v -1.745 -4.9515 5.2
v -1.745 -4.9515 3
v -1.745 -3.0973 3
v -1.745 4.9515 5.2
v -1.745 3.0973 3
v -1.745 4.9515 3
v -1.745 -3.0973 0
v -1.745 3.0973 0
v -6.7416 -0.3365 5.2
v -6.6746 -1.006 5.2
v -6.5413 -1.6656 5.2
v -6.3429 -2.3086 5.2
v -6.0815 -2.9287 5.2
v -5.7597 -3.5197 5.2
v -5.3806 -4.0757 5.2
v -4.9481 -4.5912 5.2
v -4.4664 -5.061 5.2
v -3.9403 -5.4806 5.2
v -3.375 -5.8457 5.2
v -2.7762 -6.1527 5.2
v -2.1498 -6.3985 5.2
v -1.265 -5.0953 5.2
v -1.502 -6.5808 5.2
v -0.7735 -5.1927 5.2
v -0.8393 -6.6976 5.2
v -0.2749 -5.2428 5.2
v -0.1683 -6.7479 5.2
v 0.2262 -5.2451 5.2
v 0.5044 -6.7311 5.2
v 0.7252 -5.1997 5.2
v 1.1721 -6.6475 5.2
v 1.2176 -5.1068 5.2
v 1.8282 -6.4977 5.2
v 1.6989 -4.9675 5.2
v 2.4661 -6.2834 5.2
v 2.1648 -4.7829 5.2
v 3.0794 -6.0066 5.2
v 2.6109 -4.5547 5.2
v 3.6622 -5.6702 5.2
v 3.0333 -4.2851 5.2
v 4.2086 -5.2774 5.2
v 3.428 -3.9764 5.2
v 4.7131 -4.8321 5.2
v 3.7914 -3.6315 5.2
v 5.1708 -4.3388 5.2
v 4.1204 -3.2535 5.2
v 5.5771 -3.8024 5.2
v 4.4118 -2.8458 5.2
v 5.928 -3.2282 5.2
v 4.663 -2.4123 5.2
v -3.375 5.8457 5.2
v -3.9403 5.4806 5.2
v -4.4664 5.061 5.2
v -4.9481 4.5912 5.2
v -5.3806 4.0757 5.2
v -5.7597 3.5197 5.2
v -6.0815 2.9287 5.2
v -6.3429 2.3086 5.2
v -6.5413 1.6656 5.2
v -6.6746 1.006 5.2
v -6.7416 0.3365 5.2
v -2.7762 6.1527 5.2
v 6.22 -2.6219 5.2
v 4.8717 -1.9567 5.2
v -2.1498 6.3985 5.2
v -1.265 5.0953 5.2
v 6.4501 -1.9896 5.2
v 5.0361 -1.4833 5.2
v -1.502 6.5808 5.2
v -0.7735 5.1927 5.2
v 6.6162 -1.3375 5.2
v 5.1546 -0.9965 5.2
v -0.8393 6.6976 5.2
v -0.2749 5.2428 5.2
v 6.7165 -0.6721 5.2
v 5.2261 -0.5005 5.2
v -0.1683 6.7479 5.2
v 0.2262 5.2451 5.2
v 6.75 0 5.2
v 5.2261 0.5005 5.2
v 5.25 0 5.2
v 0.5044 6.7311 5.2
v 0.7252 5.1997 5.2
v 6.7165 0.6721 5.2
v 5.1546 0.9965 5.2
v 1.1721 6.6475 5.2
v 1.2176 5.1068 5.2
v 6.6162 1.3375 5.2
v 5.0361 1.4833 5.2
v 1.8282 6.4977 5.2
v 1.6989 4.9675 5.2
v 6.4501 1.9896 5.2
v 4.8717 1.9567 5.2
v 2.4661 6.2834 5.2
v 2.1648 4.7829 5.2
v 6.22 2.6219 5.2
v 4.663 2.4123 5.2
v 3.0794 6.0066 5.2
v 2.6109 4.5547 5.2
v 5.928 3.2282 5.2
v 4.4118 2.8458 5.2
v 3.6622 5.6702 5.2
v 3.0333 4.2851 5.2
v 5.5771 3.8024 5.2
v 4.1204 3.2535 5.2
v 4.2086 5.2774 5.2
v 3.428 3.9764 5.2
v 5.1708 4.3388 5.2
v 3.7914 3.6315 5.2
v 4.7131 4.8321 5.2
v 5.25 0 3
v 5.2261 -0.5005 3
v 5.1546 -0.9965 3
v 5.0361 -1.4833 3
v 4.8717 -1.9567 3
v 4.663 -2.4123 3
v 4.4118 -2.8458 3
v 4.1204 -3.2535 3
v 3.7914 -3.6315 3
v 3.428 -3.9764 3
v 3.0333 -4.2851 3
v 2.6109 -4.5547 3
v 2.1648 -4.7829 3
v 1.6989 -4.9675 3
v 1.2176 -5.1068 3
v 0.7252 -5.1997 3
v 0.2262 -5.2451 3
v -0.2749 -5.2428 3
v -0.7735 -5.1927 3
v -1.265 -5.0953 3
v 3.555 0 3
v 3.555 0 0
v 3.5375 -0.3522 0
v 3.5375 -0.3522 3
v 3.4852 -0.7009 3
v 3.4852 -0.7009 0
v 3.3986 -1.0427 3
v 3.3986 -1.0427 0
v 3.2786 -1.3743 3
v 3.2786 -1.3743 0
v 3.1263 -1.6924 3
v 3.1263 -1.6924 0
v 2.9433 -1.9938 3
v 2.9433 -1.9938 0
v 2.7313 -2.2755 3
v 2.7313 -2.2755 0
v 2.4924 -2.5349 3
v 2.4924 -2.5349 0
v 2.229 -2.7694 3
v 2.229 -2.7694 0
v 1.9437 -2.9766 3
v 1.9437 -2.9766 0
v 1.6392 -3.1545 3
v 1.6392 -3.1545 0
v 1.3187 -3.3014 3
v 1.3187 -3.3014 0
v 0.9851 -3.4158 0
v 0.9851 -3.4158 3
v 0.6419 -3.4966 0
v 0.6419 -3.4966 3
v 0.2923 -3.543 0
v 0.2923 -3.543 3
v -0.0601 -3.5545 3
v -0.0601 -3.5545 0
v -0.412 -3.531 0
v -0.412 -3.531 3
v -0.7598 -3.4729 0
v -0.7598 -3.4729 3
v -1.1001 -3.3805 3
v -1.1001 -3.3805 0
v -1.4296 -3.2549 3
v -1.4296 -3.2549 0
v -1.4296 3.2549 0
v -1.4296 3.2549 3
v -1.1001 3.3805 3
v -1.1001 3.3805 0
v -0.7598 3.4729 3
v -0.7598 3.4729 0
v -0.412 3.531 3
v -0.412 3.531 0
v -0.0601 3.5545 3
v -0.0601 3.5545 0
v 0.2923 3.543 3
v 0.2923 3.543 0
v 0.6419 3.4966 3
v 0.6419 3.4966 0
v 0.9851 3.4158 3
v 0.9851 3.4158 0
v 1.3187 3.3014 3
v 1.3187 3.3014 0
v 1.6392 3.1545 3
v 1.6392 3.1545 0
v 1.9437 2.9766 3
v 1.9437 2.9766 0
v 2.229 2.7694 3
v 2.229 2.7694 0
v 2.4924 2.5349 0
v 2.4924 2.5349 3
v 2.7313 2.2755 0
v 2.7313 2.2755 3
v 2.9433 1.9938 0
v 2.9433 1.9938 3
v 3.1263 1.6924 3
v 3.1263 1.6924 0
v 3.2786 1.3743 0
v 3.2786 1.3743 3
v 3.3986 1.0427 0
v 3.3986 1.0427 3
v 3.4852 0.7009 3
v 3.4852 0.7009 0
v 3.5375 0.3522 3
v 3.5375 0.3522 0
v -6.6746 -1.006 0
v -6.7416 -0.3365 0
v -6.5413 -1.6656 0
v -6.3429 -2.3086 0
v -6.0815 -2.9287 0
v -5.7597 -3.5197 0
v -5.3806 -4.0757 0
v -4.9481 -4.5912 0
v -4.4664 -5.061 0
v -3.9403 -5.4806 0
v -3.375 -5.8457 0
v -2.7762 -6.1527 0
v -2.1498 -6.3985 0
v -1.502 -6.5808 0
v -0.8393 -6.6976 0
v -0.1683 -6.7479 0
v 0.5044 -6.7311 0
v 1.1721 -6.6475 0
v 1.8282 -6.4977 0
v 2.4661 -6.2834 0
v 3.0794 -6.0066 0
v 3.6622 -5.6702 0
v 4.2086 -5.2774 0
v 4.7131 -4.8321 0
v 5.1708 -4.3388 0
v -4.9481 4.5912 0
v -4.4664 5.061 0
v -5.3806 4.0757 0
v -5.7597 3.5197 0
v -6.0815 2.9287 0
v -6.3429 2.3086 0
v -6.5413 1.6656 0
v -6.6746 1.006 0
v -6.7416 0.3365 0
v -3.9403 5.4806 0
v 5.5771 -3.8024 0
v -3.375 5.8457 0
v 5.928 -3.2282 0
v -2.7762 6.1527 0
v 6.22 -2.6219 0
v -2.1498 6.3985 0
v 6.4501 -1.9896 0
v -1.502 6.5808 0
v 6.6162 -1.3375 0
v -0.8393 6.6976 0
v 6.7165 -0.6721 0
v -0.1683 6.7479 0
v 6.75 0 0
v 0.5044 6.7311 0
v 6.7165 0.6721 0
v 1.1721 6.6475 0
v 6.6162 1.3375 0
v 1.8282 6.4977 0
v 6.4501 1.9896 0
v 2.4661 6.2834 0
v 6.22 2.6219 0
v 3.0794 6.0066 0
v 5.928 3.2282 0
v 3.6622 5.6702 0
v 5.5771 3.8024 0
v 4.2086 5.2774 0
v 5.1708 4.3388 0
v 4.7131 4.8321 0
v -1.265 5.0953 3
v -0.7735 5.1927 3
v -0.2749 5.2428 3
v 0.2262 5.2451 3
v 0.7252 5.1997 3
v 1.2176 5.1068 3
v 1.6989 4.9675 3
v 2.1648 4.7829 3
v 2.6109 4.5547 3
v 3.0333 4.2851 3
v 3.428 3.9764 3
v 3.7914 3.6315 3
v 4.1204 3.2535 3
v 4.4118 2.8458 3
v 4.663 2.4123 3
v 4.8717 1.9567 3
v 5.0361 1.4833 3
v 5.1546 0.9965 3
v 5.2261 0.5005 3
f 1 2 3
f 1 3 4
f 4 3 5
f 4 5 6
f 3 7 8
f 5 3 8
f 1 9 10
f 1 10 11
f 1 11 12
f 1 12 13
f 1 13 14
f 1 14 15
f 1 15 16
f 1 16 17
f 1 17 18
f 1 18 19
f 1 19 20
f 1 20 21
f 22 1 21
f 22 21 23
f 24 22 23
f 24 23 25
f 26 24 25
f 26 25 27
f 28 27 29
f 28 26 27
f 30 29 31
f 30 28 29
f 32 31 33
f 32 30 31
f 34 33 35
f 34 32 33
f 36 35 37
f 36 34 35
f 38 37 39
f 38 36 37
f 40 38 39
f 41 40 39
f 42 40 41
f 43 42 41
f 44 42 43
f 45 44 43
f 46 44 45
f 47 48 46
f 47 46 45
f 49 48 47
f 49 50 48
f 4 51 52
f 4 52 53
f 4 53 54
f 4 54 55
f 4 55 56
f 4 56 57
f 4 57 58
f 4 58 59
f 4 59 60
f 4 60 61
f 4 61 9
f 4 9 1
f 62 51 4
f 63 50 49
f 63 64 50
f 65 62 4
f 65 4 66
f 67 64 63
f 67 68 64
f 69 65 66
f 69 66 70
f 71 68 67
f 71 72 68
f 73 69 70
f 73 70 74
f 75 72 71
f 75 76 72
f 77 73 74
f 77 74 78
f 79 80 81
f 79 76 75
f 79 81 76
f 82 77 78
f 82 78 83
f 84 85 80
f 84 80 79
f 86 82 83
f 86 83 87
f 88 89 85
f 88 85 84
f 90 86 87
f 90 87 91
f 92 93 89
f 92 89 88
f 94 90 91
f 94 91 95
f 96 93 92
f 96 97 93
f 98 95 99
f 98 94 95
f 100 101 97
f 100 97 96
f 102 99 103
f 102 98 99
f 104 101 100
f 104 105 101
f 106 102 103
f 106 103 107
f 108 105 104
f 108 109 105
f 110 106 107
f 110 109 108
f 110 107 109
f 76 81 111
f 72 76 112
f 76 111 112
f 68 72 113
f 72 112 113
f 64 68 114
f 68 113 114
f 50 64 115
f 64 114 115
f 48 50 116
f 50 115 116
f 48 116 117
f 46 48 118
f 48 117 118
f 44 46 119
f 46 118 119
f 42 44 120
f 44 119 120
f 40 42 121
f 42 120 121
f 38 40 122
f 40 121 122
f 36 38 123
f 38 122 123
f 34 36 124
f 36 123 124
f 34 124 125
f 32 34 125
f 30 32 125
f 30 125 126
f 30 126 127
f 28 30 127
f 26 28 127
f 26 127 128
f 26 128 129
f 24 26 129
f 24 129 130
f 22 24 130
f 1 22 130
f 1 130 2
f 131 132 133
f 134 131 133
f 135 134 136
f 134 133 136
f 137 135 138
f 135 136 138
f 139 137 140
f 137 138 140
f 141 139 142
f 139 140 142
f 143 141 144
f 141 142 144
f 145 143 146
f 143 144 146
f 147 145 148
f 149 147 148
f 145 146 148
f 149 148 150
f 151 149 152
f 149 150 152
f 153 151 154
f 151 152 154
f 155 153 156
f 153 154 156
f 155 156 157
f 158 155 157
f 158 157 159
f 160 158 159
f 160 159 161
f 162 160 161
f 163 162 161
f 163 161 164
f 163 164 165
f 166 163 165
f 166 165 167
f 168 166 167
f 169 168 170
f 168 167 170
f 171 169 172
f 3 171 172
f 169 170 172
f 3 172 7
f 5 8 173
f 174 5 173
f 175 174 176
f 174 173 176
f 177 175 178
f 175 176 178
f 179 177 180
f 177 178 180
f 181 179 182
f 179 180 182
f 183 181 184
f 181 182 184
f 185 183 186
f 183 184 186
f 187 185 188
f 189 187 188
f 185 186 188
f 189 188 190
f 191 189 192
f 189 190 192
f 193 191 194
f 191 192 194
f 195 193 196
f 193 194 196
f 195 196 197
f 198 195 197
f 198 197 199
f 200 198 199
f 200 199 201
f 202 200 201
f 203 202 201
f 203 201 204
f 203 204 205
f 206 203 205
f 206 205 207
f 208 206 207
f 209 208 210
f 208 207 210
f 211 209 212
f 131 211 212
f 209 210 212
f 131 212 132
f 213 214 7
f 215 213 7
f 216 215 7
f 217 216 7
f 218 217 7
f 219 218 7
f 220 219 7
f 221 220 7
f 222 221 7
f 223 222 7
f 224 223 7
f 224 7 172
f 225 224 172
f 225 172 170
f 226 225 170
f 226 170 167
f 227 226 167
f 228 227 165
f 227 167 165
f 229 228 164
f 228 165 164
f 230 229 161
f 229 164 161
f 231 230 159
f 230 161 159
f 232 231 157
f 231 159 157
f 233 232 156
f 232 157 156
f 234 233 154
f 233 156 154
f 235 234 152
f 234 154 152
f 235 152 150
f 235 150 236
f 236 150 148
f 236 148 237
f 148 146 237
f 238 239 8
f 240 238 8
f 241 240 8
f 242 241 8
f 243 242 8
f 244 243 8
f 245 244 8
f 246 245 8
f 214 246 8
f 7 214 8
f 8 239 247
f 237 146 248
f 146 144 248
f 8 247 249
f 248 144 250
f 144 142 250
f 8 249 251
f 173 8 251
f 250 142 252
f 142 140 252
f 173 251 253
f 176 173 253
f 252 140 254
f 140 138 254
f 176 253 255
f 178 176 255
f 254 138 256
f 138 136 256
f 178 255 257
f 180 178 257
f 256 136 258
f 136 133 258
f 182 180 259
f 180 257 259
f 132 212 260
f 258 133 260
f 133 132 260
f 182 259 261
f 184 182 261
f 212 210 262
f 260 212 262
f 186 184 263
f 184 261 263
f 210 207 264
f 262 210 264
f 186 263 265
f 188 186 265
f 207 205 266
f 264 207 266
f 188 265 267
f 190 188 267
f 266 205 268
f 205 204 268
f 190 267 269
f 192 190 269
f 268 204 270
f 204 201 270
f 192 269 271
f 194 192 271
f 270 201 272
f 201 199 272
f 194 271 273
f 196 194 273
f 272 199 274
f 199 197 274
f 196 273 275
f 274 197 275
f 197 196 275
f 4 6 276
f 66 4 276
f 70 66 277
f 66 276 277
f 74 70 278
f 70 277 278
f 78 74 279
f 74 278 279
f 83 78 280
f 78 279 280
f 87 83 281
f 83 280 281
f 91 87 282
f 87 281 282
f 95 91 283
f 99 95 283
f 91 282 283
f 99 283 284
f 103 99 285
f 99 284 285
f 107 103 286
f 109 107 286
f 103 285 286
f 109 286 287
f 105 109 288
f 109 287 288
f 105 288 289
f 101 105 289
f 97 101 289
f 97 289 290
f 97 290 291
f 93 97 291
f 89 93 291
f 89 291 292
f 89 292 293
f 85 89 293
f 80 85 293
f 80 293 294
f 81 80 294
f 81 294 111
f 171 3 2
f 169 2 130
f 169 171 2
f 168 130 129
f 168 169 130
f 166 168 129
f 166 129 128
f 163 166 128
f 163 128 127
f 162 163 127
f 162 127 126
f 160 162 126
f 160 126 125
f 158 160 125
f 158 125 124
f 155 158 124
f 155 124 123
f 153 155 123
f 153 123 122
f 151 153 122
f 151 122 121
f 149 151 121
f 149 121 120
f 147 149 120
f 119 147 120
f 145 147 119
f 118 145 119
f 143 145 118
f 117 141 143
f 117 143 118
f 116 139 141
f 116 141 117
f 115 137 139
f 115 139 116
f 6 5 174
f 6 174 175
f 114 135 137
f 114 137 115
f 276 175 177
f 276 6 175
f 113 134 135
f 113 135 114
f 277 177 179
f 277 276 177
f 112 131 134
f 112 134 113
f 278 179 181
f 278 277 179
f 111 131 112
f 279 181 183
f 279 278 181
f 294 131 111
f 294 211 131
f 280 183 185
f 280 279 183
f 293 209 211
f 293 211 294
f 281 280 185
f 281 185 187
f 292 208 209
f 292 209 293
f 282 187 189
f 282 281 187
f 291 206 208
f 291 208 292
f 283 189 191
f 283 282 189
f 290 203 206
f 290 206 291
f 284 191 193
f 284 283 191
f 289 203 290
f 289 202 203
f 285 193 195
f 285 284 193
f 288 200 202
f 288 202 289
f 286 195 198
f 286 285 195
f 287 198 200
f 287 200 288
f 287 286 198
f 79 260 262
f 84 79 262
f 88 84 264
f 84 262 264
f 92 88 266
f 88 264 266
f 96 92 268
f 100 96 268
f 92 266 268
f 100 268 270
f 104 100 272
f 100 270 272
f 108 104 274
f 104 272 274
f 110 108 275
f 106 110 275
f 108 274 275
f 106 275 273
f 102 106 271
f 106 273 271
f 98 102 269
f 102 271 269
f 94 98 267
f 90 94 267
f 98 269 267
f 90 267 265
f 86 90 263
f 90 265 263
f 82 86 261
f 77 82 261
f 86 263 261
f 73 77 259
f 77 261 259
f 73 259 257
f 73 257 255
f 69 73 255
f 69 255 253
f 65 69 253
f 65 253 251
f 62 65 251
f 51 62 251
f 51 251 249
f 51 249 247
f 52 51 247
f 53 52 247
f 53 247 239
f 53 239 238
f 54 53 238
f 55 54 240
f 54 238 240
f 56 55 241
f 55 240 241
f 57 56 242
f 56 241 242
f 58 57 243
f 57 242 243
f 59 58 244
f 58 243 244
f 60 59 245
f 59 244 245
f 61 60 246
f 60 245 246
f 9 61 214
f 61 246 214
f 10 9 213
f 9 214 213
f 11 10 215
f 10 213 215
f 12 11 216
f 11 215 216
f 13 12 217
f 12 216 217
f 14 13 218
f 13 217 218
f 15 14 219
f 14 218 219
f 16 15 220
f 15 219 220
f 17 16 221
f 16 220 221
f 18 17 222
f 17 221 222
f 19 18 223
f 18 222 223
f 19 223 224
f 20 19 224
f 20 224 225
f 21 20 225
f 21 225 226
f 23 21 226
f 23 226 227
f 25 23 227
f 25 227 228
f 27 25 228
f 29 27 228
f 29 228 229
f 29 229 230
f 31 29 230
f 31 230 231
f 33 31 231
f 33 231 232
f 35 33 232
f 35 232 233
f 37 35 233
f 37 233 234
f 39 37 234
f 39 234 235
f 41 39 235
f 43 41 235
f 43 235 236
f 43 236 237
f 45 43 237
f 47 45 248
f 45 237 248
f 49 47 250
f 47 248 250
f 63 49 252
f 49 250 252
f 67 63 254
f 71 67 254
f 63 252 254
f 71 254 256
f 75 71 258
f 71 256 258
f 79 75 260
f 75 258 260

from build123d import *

# Parameters (mm, degrees)
F1_DEPTH = 3
F0_R     = 6.75
F2_DEPTH = 5.2


with BuildPart() as f1:
    # F0 (on Top) → F1 (new body)
    with BuildSketch(Plane.XY):
        with BuildLine():
            ThreePointArc((-1.745, 3.0972568508), (1.7936763922, 3.0693240298), (3.555, 0))
            ThreePointArc((3.555, 0), (1.7936763922, -3.0693240298), (-1.745, -3.0972568508))
            Line((-1.745, -3.0972568508), (-1.745, -4.9515123952))
            ThreePointArc((-1.745, -4.9515123952), (3.0332532041, -4.2850758453), (5.25, 0))
            ThreePointArc((5.25, 0), (3.0332532041, 4.2850758453), (-1.745, 4.9515123952))
            Line((-1.745, 4.9515123952), (-1.745, 3.0972568508))
        make_face()
    extrude(amount=F1_DEPTH)

    # F0 (on Top) → F2 (join)
    with BuildSketch(Plane.XY):
        Circle(F0_R)
        with BuildLine():
            ThreePointArc((-1.745, -4.9515123952), (-5.25, 0), (-1.745, 4.9515123952))
            ThreePointArc((-1.745, 4.9515123952), (3.0332532041, 4.2850758453), (5.25, 0))
            ThreePointArc((5.25, 0), (3.0332532041, -4.2850758453), (-1.745, -4.9515123952))
        make_face(mode=Mode.SUBTRACT)
        with BuildLine():
            ThreePointArc((-1.745, -3.0972568508), (-3.555, 0), (-1.745, 3.0972568508))
            Line((-1.745, 3.0972568508), (-1.745, 4.9515123952))
            ThreePointArc((-1.745, 4.9515123952), (-5.25, 0), (-1.745, -4.9515123952))
            Line((-1.745, -4.9515123952), (-1.745, -3.0972568508))
        make_face()
        with BuildLine():
            Line((-1.745, 0), (-1.745, 3.0972568508))
            ThreePointArc((-1.745, 3.0972568508), (-3.555, 0), (-1.745, -3.0972568508))
            Line((-1.745, -3.0972568508), (-1.745, 0))
        make_face()
    extrude(amount=F2_DEPTH)


solid = f1.part
